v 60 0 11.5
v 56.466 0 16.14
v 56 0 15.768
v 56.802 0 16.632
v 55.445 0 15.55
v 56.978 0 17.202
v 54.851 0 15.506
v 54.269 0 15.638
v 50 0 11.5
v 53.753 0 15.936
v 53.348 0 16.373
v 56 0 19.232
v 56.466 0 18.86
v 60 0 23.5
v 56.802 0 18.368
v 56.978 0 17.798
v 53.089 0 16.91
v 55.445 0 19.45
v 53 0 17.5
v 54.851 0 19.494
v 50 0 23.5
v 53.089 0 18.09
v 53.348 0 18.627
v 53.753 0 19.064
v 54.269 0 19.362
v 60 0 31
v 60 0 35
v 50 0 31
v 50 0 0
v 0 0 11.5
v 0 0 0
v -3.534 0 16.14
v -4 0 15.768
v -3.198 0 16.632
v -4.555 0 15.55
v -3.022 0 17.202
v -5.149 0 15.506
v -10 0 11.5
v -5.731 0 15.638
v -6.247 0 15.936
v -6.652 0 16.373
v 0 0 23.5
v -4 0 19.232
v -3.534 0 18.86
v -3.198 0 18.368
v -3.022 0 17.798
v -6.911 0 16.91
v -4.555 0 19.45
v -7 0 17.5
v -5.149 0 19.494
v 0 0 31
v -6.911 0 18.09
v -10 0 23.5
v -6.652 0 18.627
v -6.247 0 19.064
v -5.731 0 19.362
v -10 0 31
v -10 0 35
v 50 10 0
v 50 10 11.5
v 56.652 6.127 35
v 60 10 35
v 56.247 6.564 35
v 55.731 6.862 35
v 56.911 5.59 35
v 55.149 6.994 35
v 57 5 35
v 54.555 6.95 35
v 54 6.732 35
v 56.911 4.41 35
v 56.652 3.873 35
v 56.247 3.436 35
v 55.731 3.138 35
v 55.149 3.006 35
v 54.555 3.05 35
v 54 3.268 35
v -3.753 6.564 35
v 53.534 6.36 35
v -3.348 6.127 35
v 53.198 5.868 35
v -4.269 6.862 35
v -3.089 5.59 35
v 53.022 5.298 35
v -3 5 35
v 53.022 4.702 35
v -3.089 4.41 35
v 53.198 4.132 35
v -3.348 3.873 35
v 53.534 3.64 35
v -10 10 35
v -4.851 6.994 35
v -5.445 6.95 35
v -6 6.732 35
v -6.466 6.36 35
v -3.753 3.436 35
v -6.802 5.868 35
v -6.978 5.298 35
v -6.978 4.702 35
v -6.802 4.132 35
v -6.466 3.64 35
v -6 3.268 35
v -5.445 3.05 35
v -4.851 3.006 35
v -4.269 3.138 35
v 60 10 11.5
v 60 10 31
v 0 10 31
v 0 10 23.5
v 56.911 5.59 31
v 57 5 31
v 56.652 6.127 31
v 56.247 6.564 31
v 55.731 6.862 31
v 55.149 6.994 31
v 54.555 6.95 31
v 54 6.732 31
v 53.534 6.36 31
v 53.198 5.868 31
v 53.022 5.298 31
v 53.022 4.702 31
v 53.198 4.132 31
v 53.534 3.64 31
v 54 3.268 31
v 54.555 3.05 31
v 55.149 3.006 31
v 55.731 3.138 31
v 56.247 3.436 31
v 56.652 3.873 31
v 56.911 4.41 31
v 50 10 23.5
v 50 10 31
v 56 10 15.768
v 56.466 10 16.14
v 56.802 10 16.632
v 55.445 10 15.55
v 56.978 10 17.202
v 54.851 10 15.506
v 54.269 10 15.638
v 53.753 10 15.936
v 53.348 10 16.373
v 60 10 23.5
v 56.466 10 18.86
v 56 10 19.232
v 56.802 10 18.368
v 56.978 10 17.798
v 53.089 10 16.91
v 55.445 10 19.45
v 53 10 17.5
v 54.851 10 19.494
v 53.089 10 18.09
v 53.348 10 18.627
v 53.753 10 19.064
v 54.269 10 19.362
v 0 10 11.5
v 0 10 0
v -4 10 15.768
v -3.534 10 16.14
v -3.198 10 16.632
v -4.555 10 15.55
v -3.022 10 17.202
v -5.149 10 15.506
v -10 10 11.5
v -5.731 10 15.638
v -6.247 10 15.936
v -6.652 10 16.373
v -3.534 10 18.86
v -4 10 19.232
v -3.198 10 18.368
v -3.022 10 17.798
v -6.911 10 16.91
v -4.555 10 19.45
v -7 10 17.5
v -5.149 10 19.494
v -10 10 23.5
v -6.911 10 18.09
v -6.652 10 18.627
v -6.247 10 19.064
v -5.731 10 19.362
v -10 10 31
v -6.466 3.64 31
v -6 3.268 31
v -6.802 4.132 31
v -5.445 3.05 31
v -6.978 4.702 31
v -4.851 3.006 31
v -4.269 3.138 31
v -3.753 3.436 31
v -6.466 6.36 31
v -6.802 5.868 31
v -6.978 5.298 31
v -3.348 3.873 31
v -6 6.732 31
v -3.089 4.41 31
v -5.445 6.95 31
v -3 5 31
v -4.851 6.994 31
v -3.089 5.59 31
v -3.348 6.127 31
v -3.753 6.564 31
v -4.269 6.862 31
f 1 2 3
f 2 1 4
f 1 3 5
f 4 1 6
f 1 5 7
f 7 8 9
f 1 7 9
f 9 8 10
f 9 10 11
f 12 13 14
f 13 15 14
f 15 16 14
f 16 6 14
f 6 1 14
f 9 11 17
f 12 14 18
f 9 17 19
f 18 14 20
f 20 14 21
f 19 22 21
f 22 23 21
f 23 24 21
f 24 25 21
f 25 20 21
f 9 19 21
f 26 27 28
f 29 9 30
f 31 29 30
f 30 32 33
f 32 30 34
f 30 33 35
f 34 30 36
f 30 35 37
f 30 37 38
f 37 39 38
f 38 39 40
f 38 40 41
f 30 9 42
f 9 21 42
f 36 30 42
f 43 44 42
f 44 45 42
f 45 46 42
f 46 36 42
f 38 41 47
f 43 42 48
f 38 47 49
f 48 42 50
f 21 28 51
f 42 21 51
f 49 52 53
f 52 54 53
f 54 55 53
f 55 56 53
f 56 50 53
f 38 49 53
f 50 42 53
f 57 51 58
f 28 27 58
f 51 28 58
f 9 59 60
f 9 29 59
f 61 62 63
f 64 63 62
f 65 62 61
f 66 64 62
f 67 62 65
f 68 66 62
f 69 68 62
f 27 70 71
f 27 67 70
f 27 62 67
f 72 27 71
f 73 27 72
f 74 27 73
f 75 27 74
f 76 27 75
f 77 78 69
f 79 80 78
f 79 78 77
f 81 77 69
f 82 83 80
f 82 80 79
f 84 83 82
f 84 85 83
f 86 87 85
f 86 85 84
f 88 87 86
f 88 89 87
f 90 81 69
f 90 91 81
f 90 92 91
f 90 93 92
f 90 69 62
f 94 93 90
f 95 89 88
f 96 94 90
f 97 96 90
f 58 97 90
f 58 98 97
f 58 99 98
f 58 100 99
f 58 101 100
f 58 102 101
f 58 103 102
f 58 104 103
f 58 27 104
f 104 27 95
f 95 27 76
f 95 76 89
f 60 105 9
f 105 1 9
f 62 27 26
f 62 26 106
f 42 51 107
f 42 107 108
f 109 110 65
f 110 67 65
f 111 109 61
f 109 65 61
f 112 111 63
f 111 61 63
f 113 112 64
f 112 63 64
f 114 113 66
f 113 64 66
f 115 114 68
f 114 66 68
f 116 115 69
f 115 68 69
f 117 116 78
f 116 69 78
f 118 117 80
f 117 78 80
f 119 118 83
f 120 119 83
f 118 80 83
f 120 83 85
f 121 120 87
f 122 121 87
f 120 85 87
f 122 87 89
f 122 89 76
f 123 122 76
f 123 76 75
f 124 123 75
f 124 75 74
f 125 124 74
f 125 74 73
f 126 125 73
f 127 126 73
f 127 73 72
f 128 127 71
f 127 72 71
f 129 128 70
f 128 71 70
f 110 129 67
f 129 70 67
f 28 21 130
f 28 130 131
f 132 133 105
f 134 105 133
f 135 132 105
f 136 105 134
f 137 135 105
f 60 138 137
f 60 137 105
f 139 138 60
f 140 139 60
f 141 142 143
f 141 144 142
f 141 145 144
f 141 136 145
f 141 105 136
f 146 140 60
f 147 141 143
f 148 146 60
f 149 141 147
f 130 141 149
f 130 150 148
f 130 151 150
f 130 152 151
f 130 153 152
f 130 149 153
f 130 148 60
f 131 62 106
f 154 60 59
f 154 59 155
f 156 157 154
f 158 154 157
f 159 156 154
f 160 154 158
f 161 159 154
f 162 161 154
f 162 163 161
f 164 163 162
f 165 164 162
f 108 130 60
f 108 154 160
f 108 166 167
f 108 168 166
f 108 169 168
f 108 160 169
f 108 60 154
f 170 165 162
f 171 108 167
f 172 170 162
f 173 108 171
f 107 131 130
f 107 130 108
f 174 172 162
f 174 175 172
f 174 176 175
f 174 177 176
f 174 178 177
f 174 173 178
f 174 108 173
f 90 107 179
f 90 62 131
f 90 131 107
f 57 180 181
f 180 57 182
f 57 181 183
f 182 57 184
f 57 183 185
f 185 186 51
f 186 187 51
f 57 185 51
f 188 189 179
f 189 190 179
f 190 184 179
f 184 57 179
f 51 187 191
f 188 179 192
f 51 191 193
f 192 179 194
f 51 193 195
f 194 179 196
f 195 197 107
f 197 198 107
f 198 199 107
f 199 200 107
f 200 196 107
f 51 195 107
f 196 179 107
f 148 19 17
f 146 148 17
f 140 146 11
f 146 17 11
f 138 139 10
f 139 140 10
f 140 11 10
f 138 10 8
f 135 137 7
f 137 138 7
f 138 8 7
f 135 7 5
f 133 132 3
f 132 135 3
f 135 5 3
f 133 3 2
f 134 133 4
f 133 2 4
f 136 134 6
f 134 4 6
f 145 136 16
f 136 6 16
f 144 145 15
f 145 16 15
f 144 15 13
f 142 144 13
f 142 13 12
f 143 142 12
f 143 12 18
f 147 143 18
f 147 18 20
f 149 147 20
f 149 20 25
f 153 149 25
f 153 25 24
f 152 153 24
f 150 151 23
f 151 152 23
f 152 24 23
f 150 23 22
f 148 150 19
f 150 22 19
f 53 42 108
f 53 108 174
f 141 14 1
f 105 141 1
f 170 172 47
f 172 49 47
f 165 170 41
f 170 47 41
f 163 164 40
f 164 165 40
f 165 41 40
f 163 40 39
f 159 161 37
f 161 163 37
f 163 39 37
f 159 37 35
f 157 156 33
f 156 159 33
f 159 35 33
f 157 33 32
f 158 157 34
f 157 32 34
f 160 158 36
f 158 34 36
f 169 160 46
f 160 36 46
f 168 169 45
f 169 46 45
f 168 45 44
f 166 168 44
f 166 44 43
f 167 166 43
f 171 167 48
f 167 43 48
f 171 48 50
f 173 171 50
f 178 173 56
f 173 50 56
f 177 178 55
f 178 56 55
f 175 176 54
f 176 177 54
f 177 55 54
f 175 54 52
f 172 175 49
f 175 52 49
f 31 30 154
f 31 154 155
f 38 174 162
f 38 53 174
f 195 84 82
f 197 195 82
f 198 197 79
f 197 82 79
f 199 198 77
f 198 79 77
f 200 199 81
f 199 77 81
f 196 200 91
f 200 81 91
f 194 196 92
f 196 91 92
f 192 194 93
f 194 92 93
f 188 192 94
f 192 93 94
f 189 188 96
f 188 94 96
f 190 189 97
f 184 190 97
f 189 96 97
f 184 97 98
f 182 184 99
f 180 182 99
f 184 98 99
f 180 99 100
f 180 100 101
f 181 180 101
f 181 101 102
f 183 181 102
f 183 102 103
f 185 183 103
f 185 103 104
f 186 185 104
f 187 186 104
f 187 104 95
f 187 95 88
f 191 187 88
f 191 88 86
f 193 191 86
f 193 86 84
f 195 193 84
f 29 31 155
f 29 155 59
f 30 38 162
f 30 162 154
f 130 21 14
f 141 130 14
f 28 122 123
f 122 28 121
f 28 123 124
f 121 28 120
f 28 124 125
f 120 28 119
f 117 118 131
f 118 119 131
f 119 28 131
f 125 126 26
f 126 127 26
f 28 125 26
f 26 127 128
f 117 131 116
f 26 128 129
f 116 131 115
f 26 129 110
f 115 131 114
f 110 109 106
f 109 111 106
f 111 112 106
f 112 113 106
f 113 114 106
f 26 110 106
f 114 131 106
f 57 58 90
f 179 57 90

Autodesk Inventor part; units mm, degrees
ref_plane "YZ Plane" through (0, 0, 0) normal (1, 0, 0) x (0, 1, 0)
ref_plane "XZ Plane" through (0, 0, 0) normal (0, 1, 0) x (-1, 0, 0)
ref_plane "XY Plane" through (0, 0, 0) normal (0, 0, 1) x (1, 0, 0)
sketch "Sketch1" plane through (0, 0, 0) normal (0, 1, 0) x (-1, 0, 0)
  line L0 (0, 0) -> (-50, 0)
  line L1 (-50, 0) -> (-50, 35)
  line L2 (-50, 35) -> (0, 35)
  line L3 (0, 35) -> (0, 0)
  line L4 (0, 23.5) -> (10, 23.5)
  line L5 (10, 23.5) -> (10, 11.5)
  line L6 (10, 11.5) -> (0, 11.5)
  line L7 (0, 11.5) -> (0, 23.5)
  line L8 (-50, 23.5) -> (-60, 23.5)
  line L9 (-60, 23.5) -> (-60, 11.5)
  line L10 (-60, 11.5) -> (-50, 11.5)
  line L11 (-50, 11.5) -> (-50, 23.5)
  circle A0 centre (5, 17.5) radius 2
  circle A1 centre (-55, 17.5) radius 2
  dimension "d0" = 50
  dimension "d1" = 35
  dimension "d2" = 10
  dimension "d3" = 12
  dimension "d4" = 11.5
  dimension "d5" = 10
  dimension "d6" = 4
  dimension "d7" = 4
extrude "Extrusion1" add sketch "Sketch1" along normal blind 10
sketch "Sketch2" plane through (0, 0, 35) normal (0, 0, 1) x (1, 0, 0)
  line L0 (50, 0) -> (0, 0) projected
  line L1 (50, 0) -> (50, 10) projected
  line L2 (0, 10) -> (50, 10) projected
  line L3 (0, 0) -> (0, 10) projected
  line L4 (0, 0) -> (-10, 0) projected
  line L5 (0, 0) -> (0, 10) projected
  line L6 (-10, 10) -> (0, 10) projected
  line L7 (-10, 0) -> (-10, 10) projected
  line L8 (50, 0) -> (60, 0) projected
  line L9 (60, 0) -> (60, 10) projected
  line L10 (50, 10) -> (60, 10) projected
  line L11 (50, 0) -> (50, 10) projected
  circle A0 centre (-5, 5) radius 2
  circle A1 centre (55, 5) radius 2
  dimension "d10" = 4
  dimension "d11" = 4
extrude "Extrusion2" add sketch "Sketch2" against normal blind 4
properties part number "00_laserdriver_Pcb"
